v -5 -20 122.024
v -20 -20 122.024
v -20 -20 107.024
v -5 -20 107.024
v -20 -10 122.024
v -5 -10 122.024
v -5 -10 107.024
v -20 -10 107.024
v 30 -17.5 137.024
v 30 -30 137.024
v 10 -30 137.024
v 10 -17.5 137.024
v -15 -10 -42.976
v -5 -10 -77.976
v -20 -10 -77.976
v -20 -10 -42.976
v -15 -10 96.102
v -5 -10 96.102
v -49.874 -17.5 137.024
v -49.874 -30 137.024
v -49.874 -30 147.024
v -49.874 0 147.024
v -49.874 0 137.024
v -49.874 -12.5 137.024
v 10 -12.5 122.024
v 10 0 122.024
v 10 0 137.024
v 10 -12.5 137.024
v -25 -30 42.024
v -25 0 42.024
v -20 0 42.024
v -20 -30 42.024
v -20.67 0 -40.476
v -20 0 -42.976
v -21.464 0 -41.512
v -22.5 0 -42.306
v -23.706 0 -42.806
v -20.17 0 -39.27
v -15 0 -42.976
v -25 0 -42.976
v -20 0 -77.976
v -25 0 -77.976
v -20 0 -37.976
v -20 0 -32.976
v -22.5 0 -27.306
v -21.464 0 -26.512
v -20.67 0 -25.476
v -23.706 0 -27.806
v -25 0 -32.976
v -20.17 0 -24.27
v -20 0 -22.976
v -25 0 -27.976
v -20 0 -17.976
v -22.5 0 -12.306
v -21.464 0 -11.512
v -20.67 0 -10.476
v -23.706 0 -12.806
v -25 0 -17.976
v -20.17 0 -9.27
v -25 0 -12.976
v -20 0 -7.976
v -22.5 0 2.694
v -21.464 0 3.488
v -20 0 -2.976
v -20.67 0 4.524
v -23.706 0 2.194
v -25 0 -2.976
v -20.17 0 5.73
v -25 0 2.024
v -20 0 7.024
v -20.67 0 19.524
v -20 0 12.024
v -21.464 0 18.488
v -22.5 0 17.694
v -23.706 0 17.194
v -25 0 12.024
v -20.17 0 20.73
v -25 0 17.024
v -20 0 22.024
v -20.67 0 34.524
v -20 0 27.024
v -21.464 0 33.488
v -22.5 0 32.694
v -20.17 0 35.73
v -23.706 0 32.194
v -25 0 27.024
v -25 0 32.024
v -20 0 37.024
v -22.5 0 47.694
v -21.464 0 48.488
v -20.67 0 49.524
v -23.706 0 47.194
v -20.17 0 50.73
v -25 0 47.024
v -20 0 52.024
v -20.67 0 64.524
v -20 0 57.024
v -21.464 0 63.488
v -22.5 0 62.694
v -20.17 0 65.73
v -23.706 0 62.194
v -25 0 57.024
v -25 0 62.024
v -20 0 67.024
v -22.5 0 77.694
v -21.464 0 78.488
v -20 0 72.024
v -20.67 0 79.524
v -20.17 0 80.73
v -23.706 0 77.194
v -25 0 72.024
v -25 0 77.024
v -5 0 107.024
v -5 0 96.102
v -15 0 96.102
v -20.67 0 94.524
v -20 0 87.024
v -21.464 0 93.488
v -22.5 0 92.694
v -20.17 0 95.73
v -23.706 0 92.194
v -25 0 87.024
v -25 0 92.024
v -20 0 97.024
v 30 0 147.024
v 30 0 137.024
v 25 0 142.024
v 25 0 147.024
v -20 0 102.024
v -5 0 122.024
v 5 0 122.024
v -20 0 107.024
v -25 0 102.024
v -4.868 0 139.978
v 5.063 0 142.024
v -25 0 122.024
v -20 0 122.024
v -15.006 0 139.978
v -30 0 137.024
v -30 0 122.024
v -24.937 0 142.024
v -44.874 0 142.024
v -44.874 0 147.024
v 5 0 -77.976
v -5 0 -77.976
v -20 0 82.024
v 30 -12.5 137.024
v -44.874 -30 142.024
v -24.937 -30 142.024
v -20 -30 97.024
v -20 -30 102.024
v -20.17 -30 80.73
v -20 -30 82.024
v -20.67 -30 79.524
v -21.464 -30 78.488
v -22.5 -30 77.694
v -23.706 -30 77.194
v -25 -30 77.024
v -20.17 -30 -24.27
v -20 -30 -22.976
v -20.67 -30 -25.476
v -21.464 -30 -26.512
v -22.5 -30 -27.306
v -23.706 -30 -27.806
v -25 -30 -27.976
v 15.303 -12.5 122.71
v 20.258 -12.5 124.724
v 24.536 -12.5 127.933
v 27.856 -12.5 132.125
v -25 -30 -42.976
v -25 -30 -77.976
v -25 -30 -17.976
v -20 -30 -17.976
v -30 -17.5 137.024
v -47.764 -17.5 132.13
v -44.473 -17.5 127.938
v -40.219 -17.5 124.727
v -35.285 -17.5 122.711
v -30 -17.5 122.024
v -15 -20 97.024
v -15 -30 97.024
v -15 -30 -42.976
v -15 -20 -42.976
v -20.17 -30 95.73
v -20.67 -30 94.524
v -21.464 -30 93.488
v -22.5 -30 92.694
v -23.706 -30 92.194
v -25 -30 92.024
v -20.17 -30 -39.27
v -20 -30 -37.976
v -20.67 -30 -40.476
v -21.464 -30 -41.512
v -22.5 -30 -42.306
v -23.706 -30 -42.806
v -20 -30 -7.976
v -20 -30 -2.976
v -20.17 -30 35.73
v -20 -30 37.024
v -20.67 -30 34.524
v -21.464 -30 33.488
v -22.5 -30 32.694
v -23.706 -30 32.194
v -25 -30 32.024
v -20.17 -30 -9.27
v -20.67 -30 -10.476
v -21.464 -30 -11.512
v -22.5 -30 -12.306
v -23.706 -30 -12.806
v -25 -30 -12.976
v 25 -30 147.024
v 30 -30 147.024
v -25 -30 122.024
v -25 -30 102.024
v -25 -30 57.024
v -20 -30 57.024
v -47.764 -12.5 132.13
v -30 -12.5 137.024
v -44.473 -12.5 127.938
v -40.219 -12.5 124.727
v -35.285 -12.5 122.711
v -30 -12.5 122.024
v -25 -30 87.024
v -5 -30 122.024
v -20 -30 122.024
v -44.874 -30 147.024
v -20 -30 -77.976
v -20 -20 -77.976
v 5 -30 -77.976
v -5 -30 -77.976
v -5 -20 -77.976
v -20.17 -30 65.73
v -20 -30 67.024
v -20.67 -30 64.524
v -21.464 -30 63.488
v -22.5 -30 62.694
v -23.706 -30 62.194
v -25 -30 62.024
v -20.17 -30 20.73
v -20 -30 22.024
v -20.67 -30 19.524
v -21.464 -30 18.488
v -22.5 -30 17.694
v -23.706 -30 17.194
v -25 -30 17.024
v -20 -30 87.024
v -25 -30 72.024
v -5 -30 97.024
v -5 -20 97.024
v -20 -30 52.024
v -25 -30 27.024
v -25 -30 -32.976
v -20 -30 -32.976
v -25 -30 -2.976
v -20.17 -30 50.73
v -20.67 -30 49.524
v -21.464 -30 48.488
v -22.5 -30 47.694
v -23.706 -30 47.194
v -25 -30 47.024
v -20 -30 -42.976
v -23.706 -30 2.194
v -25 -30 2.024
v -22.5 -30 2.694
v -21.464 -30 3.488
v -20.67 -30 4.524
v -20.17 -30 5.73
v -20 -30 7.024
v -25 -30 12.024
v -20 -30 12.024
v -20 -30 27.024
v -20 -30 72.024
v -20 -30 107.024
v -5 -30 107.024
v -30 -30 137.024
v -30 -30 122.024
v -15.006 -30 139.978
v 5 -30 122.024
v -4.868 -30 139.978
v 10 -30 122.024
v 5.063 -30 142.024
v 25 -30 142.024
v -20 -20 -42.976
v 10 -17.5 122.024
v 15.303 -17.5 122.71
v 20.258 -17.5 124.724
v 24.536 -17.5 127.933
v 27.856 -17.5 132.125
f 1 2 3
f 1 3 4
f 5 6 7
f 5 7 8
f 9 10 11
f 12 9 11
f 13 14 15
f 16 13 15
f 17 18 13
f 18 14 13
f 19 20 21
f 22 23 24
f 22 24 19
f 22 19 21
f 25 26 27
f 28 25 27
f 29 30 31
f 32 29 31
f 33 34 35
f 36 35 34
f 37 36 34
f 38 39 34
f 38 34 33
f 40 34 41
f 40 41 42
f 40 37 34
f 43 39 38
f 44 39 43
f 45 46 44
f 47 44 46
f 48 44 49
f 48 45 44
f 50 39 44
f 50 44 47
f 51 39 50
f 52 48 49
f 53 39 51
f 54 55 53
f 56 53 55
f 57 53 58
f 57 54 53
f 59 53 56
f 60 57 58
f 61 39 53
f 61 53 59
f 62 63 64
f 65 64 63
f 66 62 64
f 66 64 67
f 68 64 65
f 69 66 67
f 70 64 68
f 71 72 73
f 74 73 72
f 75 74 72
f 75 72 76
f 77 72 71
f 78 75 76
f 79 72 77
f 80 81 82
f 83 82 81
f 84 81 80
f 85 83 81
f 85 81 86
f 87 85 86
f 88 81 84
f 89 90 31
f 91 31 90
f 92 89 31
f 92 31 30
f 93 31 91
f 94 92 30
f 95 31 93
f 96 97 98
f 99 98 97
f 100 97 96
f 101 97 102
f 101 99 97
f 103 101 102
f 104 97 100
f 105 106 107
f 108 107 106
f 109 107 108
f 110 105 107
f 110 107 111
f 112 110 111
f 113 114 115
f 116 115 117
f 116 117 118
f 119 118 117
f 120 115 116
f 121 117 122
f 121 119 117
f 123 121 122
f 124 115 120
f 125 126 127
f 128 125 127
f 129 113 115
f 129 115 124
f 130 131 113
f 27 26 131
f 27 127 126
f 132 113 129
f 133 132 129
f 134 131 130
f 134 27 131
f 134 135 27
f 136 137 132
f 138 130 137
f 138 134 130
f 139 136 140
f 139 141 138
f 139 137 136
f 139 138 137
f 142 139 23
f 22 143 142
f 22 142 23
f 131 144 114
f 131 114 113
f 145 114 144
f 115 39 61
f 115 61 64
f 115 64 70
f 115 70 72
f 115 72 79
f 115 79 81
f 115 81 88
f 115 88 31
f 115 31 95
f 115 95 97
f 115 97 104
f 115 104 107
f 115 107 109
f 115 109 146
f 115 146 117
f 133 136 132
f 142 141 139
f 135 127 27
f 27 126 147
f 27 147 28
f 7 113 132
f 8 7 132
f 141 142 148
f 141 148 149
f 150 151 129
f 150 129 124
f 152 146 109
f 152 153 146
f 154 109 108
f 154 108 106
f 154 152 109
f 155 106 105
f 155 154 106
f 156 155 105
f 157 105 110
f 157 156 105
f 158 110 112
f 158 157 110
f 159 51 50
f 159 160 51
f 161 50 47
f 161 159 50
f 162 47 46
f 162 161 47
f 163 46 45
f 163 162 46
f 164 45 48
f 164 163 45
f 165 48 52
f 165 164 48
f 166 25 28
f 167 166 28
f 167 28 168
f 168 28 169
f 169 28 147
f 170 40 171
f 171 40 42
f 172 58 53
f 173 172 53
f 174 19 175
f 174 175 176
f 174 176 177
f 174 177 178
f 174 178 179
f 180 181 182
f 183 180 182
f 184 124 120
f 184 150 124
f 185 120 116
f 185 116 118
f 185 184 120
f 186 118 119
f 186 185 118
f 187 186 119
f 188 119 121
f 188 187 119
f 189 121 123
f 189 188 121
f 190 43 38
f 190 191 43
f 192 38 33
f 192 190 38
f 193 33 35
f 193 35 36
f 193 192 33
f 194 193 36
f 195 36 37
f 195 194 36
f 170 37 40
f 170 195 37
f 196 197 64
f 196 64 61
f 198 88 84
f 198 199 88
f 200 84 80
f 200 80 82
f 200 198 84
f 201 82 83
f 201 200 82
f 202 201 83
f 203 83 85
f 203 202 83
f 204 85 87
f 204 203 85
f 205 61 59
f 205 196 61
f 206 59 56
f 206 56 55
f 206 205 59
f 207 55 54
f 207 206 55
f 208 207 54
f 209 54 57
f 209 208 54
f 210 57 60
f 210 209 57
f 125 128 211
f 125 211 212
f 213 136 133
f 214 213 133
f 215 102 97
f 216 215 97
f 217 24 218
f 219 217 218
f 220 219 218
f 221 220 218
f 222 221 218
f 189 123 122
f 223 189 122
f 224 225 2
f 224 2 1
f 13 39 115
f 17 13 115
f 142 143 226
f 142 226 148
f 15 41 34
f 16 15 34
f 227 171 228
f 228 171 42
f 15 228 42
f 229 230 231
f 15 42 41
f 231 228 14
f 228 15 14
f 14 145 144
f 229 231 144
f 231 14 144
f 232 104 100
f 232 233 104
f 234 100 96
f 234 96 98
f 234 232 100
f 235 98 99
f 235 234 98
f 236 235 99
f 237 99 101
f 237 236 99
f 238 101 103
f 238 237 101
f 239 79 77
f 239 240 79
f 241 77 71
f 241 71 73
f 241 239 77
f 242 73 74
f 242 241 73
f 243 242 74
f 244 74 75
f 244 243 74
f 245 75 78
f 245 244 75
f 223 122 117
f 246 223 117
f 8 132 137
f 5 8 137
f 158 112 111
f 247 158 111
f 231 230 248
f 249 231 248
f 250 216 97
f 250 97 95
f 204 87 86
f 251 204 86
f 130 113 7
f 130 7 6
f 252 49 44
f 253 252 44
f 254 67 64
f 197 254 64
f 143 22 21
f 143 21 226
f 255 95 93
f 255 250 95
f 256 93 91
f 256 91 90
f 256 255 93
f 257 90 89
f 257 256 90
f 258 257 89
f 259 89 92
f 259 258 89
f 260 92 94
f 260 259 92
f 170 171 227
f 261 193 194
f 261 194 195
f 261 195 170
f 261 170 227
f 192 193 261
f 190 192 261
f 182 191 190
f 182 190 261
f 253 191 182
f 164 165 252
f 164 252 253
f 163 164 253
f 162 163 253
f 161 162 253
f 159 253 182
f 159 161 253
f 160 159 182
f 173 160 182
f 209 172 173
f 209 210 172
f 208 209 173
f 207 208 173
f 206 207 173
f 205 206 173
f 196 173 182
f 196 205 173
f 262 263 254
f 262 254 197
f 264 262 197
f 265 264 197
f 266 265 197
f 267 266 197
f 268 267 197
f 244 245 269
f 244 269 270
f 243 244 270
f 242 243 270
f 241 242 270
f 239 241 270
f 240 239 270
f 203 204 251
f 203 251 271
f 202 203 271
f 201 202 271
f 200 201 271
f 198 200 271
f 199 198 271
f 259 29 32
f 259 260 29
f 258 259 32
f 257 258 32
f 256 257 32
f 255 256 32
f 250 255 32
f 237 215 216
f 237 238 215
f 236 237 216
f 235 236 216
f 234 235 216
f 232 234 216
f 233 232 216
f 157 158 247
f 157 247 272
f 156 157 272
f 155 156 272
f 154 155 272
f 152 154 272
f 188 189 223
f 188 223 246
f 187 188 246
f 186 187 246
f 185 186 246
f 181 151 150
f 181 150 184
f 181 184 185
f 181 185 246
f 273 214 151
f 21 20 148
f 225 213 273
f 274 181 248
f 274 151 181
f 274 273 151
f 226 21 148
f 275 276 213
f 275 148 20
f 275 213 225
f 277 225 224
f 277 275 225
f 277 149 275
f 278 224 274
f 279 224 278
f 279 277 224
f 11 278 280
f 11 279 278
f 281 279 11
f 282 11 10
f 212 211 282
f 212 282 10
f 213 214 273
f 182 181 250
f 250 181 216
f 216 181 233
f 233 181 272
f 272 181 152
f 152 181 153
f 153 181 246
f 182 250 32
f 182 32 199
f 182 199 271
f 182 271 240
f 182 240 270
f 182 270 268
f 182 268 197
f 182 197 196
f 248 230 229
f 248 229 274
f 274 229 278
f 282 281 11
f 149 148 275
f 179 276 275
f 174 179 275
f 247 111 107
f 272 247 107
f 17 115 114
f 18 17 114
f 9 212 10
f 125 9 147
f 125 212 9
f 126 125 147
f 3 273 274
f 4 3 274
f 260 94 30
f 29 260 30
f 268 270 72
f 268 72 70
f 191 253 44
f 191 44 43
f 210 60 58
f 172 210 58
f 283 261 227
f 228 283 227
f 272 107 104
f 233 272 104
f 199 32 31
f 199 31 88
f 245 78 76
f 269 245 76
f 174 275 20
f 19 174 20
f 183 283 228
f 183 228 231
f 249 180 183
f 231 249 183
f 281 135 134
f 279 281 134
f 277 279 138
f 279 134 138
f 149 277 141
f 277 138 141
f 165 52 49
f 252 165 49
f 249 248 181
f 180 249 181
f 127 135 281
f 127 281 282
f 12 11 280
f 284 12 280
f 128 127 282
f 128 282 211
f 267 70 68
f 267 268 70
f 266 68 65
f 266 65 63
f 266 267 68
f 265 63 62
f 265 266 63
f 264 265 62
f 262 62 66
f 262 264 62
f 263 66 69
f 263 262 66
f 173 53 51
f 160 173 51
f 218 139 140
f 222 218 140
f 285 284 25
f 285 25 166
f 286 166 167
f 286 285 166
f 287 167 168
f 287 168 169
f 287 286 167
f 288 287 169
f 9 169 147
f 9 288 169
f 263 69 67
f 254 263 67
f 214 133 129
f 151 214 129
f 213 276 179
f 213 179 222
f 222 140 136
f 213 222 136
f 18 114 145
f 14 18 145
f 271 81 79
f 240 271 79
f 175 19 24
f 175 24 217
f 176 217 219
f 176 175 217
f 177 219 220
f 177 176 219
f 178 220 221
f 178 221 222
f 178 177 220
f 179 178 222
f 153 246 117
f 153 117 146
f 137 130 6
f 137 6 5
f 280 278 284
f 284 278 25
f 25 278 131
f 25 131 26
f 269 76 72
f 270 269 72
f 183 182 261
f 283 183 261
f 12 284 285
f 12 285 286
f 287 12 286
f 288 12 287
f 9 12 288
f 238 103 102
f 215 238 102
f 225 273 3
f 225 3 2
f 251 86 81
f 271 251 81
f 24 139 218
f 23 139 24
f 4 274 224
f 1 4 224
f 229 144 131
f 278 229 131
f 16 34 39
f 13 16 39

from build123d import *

# Parameters (mm, degrees)
F1_DEPTH  = 30
F2_R      = 4.99999
F3_W      = 15
F3_H      = 15
F4_DEPTH  = 10
F5_W      = 15
F5_H      = 15
F6_DEPTH  = 10
F8_DEPTH  = 30
F10_DEPTH = 17.5
F12_DEPTH = 12.5
F14_DEPTH = 30


# Not quite as in the source:
# - a fillet or chamfer is up to 0.001 mm smaller than in the source, because OpenCascade refuses the exact size


with BuildPart() as f1:
    # F0 (on Front) → F1 (new body)
    with BuildSketch(Plane.XZ):
        Polygon((-25, -42.9761418055), (-25, -77.9761418055), (5, -77.9761418055), (5, 122.0238581945), (10, 122.0238581945), (10, 137.0238581945), (-30, 137.0238581945), (-30, 122.0238581945), (-25, 122.0238581945), (-25, 102.0238581945), (-20, 102.0238581945), (-20, 92.0238581945), (-25, 92.0238581945), (-25, 87.0238581945), (-20, 87.0238581945), (-20, 77.0238581945), (-25, 77.0238581945), (-25, 72.0238581945), (-20, 72.0238581945), (-20, 62.0238581945), (-25, 62.0238581945), (-25, 57.0238581945), (-20, 57.0238581945), (-20, 47.0238581945), (-25, 47.0238581945), (-25, 42.0238581945), (-20, 42.0238581945), (-20, 32.0238581945), (-25, 32.0238581945), (-25, 27.0238581945), (-20, 27.0238581945), (-20, 17.0238581945), (-25, 17.0238581945), (-25, 12.0238581945), (-20, 12.0238581945), (-20, 2.0238581945), (-25, 2.0238581945), (-25, -2.9761418055), (-20, -2.9761418055), (-20, -12.9761418055), (-25, -12.9761418055), (-25, -17.9761418055), (-20, -17.9761418055), (-20, -27.9761418055), (-25, -27.9761418055), (-25, -32.9761418055), (-20, -32.9761418055), (-20, -42.9761418055), align=None)
    extrude(amount=F1_DEPTH)

    # F2 (radius 5 in the source; OpenCascade refuses exactly that, so slightly less here)
    f2_edges = [f1.edges().sort_by_distance(p)[0] for p in [
        (-20, -15, 92.023858),
        (-20, -15, 77.023858),
        (-20, -15, 62.023858),
        (-20, -15, 47.023858),
        (-20, -15, 32.023858),
        (-20, -15, 17.023858),
        (-20, -15, 2.023858),
        (-20, -15, -12.976142),
        (-20, -15, -27.976142),
        (-20, -15, -42.976142),
    ]]
    fillet(f2_edges, radius=F2_R)

    # F3 (on face) → F4 (cut)
    with BuildSketch(Plane.XZ.offset(30)):
        Polygon((-15, -42.9761418055), (-20, -42.9761418055), (-20, -77.9761418055), (-5, -77.9761418055), (-5, 97.0238581945), (-15, 97.0238581945), align=None)
        with Locations((-12.5, 114.5238581945)):
            Rectangle(F3_W, F3_H)
    extrude(amount=-F4_DEPTH, mode=Mode.SUBTRACT)

    # F5 (on face) → F6 (cut)
    with BuildSketch(Plane(origin=(0, 0, 0), x_dir=(-1, 0, 0), z_dir=(0, 1, 0))):
        Polygon((20, -77.9761418055), (20, -42.9761418055), (15, -42.9761418055), (15, 96.101924777), (5, 96.101924777), (5, -77.9761418055), align=None)
        with Locations((12.5, 114.5238581945)):
            Rectangle(F5_W, F5_H)
    extrude(amount=-F6_DEPTH, mode=Mode.SUBTRACT)

    # F7 (on face) → F8 (join)
    with BuildSketch(Plane(origin=(0, 0, 0), x_dir=(-1, 0, 0), z_dir=(0, 1, 0))):
        Polygon((-30, 147.0238581945), (-30, 137.0238581945), (49.8739863932, 137.0238581945), (49.8739863932, 147.0238581945), (44.8739863932, 147.0238581945), (44.8739863932, 142.0238581945), (-25, 142.0238581945), (-25, 147.0238581945), align=None)
    extrude(amount=-F8_DEPTH)

    # F9 (on face) → F10 (join)
    with BuildSketch(Plane.XZ.offset(30)):
        with BuildLine():
            Line((-30, 137.0238581945), (-49.8739863932, 137.0238581945))
            ThreePointArc((-49.8739863932, 137.0238581945), (-42.4496519545, 126.1947551301), (-30, 122.0238581945))
            Line((-30, 122.0238581945), (-30, 137.0238581945))
        make_face()
        with BuildLine():
            ThreePointArc((10, 122.0238581945), (22.5, 126.1905248612), (30, 137.0238581945))
            Line((30, 137.0238581945), (10, 137.0238581945))
            Line((10, 137.0238581945), (10, 122.0238581945))
        make_face()
    extrude(amount=-F10_DEPTH)

    # F11 (on face) → F12 (cut)
    with BuildSketch(Plane.XZ.offset(30)):
        with BuildLine():
            Line((-30, 137.0238581945), (-49.8739863932, 137.0238581945))
            ThreePointArc((-49.8739863932, 137.0238581945), (-42.4496519545, 126.1947551301), (-30, 122.0238581945))
            Line((-30, 122.0238581945), (-30, 137.0238581945))
        make_face()
        with BuildLine():
            Line((10, 137.0238581945), (10, 122.0238581945))
            ThreePointArc((10, 122.0238581945), (22.5, 126.1905248612), (30, 137.0238581945))
            Line((30, 137.0238581945), (10, 137.0238581945))
        make_face()
    extrude(amount=-F12_DEPTH, mode=Mode.SUBTRACT)

    # F13 (on face) → F14 (cut)
    with BuildSketch(Plane(origin=(0, 0, 0), x_dir=(-1, 0, 0), z_dir=(0, 1, 0))):
        with BuildLine():
            Line((24.9369931966, 142.0238581945), (9.9369931966, 142.0238581945))
            Line((9.9369931966, 142.0238581945), (-5.0630068034, 142.0238581945))
            ThreePointArc((-5.0630068034, 142.0238581945), (9.9369931966, 139.7208182654), (24.9369931966, 142.0238581945))
        make_face()
    extrude(amount=-F14_DEPTH, mode=Mode.SUBTRACT)


solid = f1.part
